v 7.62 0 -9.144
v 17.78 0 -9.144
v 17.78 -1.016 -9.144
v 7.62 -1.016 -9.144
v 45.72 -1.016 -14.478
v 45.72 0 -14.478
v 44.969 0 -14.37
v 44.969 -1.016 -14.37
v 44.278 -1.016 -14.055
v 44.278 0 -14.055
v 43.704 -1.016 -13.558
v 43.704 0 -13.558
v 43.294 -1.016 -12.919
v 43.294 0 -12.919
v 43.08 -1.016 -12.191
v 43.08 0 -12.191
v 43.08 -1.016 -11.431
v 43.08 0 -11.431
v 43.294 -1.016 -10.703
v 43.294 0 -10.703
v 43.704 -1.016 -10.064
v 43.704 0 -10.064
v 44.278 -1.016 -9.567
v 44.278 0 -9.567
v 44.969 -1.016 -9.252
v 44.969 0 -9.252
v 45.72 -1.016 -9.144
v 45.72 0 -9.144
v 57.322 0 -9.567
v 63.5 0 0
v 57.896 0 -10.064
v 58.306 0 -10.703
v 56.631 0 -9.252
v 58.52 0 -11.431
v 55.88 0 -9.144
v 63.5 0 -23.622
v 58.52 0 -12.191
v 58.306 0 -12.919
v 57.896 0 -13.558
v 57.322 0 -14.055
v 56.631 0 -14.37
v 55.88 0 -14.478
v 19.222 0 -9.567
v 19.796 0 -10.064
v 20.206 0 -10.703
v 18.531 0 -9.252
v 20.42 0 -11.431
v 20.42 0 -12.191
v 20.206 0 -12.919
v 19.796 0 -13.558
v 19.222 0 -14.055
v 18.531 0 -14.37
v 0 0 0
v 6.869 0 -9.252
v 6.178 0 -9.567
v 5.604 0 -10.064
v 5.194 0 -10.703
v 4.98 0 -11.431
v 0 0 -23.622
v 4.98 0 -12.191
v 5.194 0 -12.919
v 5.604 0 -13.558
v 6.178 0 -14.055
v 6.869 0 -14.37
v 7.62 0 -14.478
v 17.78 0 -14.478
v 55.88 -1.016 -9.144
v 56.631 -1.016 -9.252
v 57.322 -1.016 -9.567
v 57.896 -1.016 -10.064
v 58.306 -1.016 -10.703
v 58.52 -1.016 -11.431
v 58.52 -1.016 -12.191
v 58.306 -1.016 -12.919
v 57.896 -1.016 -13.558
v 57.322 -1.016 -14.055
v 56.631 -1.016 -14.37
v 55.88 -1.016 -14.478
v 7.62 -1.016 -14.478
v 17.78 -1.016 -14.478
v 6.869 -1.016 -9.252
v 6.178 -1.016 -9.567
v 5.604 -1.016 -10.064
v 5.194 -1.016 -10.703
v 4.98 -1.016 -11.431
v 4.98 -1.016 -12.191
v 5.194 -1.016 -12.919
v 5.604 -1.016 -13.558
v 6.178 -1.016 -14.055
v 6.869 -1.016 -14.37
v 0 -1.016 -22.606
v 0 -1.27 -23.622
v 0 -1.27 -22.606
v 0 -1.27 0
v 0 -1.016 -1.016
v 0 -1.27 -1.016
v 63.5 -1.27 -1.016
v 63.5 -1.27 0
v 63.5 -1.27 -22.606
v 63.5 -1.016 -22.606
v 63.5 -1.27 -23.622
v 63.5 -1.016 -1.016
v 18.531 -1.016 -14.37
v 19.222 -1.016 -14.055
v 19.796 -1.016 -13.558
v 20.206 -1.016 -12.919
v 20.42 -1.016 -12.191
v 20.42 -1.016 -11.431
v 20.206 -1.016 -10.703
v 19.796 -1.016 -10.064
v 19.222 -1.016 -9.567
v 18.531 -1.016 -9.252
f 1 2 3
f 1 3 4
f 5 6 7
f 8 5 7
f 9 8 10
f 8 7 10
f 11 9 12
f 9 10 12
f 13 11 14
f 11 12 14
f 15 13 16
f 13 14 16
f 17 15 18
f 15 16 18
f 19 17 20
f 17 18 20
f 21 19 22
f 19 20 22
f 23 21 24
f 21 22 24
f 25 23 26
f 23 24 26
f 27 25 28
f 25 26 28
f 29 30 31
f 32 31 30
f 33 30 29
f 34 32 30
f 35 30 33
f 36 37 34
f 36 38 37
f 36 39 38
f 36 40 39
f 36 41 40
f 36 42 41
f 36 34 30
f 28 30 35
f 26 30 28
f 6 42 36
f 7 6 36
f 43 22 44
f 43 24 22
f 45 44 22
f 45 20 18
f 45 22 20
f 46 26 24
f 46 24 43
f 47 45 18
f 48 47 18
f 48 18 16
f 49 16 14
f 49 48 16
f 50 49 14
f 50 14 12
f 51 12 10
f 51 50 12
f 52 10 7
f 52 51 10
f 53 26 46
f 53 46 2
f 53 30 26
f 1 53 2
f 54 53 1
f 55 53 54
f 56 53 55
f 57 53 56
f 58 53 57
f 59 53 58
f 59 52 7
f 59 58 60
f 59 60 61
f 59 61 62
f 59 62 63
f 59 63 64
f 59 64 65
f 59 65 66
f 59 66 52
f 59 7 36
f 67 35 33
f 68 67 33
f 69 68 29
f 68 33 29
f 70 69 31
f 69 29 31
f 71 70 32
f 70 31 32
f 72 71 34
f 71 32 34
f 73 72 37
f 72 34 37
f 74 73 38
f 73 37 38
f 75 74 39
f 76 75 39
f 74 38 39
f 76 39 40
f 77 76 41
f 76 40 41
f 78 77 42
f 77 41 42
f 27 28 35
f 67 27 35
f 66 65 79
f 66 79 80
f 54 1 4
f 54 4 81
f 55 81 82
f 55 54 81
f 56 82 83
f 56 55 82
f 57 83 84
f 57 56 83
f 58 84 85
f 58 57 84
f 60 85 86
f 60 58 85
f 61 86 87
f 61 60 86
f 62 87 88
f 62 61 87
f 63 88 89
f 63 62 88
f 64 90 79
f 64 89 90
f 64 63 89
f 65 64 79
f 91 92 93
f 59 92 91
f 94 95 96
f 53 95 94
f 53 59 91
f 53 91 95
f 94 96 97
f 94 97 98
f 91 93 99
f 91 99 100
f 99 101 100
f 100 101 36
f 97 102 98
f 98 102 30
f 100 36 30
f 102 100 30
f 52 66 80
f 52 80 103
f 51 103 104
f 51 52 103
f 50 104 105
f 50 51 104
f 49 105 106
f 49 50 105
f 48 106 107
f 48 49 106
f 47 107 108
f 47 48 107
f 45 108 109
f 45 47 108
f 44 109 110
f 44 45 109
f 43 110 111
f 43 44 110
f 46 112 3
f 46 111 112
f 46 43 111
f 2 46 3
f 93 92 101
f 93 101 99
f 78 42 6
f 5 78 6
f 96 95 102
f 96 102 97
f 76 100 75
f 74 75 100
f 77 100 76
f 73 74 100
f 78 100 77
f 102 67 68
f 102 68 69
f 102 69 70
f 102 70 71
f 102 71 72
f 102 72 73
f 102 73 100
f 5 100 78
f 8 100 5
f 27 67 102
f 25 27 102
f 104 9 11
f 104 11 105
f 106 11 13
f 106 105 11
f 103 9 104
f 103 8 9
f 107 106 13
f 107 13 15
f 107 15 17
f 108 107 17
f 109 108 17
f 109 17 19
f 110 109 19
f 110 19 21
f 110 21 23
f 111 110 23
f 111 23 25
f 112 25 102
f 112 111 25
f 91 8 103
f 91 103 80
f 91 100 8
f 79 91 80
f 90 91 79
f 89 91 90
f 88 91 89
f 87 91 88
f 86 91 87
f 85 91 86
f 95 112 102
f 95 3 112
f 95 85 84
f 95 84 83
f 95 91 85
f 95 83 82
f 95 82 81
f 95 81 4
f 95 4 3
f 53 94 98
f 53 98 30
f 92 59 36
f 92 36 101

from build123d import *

# Parameters (mm, degrees)
BOSS_EXTRUDE1_DEPTH = 63.5
CUT_EXTRUDE1_DEPTH  = 68.763277548


with BuildPart() as part:
    # Sketch3 → Boss-Extrude1 (new body)
    with BuildSketch(Plane(origin=(0, 0, 0), x_dir=(0, 0, -1), z_dir=(1, 0, 0))):
        Polygon((0, 0), (23.622, 0), (23.622, -1.27), (22.606, -1.27), (22.606, -1.016), (1.016, -1.016), (1.016, -1.27), (0, -1.27), align=None)
    extrude(amount=BOSS_EXTRUDE1_DEPTH)

    # Sketch4 → Cut-Extrude1 (cut, through all)
    with BuildSketch(Plane(origin=(0, 0, 0), x_dir=(1, 0, 0), z_dir=(0, 1, 0))):
        with BuildLine():
            Line((7.62, 14.478), (17.78, 14.478))
            ThreePointArc((17.78, 14.478), (20.447, 11.811), (17.78, 9.144))
            Line((17.78, 9.144), (7.62, 9.144))
            ThreePointArc((7.62, 9.144), (4.953, 11.811), (7.62, 14.478))
        make_face()
        with BuildLine():
            Line((45.72, 9.144), (55.88, 9.144))
            ThreePointArc((55.88, 9.144), (58.547, 11.811), (55.88, 14.478))
            Line((55.88, 14.478), (45.72, 14.478))
            ThreePointArc((45.72, 14.478), (43.053, 11.811), (45.72, 9.144))
        make_face()
    extrude(amount=-CUT_EXTRUDE1_DEPTH, mode=Mode.SUBTRACT)


solid = part.part
